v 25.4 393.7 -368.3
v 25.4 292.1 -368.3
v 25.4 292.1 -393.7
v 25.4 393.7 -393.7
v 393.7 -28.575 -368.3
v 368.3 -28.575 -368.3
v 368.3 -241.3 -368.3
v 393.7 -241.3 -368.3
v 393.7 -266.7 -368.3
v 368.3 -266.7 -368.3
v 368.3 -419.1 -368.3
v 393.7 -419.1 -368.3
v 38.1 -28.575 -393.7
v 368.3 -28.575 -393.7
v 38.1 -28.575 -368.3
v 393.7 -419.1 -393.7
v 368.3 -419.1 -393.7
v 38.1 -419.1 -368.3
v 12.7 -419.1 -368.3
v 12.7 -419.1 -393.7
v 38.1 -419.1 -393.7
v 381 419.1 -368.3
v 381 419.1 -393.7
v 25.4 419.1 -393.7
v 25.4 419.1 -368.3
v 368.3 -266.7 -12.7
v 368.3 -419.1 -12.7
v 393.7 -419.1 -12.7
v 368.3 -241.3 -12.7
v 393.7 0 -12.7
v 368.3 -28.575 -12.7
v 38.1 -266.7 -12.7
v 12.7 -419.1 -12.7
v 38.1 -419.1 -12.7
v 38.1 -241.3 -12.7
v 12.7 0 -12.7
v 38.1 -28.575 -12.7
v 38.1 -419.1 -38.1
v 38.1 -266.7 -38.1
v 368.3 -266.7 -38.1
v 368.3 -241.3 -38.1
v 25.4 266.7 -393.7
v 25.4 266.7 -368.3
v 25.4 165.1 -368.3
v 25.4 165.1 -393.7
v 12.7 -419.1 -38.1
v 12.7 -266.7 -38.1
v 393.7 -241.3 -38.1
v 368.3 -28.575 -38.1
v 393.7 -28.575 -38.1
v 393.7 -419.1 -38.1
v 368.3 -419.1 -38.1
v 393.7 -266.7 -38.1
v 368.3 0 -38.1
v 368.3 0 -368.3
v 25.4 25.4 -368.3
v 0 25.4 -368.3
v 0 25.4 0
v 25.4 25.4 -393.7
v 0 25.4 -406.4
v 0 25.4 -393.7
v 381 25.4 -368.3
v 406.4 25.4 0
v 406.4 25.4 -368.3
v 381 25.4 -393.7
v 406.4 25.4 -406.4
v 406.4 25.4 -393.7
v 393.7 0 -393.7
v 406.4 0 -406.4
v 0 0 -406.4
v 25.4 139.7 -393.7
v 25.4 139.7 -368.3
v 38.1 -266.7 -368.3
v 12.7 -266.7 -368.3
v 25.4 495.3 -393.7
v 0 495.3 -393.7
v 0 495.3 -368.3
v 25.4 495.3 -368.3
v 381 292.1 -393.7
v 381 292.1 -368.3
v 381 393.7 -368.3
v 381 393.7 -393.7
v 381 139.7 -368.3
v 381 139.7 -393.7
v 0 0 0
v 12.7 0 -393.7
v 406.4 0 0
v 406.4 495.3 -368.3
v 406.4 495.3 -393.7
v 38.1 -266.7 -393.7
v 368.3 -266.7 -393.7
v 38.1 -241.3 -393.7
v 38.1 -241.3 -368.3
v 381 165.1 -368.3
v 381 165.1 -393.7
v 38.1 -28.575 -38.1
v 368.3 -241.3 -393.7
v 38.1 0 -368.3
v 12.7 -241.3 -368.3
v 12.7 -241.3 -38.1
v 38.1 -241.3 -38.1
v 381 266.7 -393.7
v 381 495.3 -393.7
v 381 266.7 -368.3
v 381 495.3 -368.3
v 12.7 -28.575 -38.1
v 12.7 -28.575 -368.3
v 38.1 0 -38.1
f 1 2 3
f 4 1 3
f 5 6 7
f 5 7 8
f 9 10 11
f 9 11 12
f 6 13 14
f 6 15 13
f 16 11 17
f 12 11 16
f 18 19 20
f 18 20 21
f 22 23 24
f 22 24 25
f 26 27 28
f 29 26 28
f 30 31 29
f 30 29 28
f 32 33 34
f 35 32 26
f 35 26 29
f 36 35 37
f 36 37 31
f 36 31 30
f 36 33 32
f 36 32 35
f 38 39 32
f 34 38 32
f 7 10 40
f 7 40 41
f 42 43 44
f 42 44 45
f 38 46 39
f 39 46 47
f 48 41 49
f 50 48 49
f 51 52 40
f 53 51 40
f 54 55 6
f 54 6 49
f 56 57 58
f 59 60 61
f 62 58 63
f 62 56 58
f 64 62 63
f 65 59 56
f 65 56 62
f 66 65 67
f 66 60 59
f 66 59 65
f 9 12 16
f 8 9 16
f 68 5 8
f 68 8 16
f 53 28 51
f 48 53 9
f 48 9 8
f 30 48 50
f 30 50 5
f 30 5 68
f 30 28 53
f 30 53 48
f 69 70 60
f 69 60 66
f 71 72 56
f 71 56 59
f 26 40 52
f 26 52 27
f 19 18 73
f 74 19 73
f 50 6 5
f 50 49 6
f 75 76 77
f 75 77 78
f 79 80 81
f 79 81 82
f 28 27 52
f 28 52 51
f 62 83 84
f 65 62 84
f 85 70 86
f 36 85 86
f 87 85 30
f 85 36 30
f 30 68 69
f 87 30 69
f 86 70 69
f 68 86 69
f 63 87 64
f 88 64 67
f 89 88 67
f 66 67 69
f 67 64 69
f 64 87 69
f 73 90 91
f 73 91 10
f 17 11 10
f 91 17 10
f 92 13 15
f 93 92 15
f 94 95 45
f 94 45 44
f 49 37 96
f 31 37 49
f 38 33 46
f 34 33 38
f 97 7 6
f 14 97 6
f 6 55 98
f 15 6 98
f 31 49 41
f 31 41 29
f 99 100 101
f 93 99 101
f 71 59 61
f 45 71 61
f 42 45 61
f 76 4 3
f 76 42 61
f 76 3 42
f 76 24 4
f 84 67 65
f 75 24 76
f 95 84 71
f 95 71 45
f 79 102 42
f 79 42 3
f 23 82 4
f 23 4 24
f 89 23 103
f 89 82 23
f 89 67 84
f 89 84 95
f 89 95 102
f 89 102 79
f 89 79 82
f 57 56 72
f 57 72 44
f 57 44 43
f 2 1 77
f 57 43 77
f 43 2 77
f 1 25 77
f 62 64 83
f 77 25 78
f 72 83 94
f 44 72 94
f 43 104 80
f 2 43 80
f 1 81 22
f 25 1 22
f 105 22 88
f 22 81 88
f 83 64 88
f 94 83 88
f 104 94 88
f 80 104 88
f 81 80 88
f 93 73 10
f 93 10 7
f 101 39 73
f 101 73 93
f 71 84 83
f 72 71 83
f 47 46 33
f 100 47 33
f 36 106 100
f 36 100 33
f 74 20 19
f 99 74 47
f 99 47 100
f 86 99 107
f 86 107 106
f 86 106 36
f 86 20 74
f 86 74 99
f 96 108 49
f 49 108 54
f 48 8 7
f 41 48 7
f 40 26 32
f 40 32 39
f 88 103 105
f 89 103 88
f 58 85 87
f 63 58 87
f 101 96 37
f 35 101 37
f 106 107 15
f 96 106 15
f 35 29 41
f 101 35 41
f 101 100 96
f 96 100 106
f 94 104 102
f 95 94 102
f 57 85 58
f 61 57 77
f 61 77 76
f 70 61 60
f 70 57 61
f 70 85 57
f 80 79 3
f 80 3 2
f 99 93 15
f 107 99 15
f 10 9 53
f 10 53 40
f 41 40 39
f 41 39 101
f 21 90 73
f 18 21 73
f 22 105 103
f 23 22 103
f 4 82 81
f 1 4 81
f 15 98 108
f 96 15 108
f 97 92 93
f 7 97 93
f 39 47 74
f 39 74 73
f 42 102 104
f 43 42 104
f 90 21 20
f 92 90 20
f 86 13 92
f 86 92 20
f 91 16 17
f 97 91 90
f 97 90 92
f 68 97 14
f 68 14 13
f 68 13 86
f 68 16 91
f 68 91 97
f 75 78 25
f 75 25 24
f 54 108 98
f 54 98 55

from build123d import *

# Parameters (mm, degrees)
SKETCH1_W            = 406.4
SKETCH1_H            = 406.4
BOSS_EXTRUDE1_DEPTH  = 25.4
SKETCH2_W            = 25.4
SKETCH2_H            = 25.4
SKETCH2_W_2          = 330.2
SKETCH2_H_2          = 330.2
BOSS_EXTRUDE4_DEPTH  = 28.575
SKETCH4_W            = 25.4
SKETCH4_H            = 25.4
BOSS_EXTRUDE5_DEPTH  = 390.525
SKETCH6_W            = 25.4
SKETCH6_H            = 25.4
BOSS_EXTRUDE6_DEPTH  = 355.6
SKETCH8_W            = 25.4
SKETCH8_H            = 25.4
BOSS_EXTRUDE7_DEPTH  = 355.6
SKETCH9_W            = 25.4
SKETCH9_H            = 25.4
BOSS_EXTRUDE8_DEPTH  = 355.6
SKETCH10_W           = 25.4
SKETCH10_H           = 25.4
BOSS_EXTRUDE9_DEPTH  = 355.6
SKETCH11_W           = 25.4
SKETCH11_H           = 25.4
BOSS_EXTRUDE11_DEPTH = 469.9
SKETCH12_W           = 25.4
SKETCH12_H           = 25.4
BOSS_EXTRUDE12_DEPTH = 376.174


with BuildPart() as part:
    # Sketch1 → Boss-Extrude1 (new body)
    with BuildSketch(Plane(origin=(0, 0, 0), x_dir=(1, 0, 0), z_dir=(0, 1, 0))):
        with Locations((203.2, 203.2)):
            Rectangle(SKETCH1_W, SKETCH1_H)
    extrude(amount=BOSS_EXTRUDE1_DEPTH)

    # Sketch2 → Boss-Extrude4 (add)
    with BuildSketch(Plane.XZ):
        with Locations((25.4, -25.4)):
            Rectangle(SKETCH2_W, SKETCH2_H)
        with Locations((203.2, -25.4)):
            Rectangle(SKETCH2_W_2, SKETCH2_H)
        with Locations((25.4, -203.2)):
            Rectangle(SKETCH2_W, SKETCH2_H_2)
        with Locations((203.2, -381)):
            Rectangle(SKETCH2_W_2, SKETCH2_H)
        with Locations((25.4, -381)):
            Rectangle(SKETCH2_W, SKETCH2_H)
        with Locations((381, -381)):
            Rectangle(SKETCH2_W, SKETCH2_H)
        with Locations((381, -203.2)):
            Rectangle(SKETCH2_W, SKETCH2_H_2)
        with Locations((381, -25.4)):
            Rectangle(SKETCH2_W, SKETCH2_H)
    extrude(amount=BOSS_EXTRUDE4_DEPTH)

    # Sketch4 → Boss-Extrude5 (add)
    with BuildSketch(Plane.XZ.offset(28.575)):
        with Locations((25.4, -25.4)):
            Rectangle(SKETCH4_W, SKETCH4_H)
        with Locations((381, -25.4)):
            Rectangle(SKETCH4_W, SKETCH4_H)
        with Locations((381, -381)):
            Rectangle(SKETCH4_W, SKETCH4_H)
        with Locations((25.4, -381)):
            Rectangle(SKETCH4_W, SKETCH4_H)
    extrude(amount=BOSS_EXTRUDE5_DEPTH)

    # Sketch6 → Boss-Extrude6 (add)
    with BuildSketch(Plane(origin=(38.1, 0, 0), x_dir=(0, 0, -1), z_dir=(1, 0, 0))):
        with Locations((25.4, -254)):
            Rectangle(SKETCH6_W, SKETCH6_H)
    extrude(amount=BOSS_EXTRUDE6_DEPTH)

    # Sketch8 → Boss-Extrude7 (add)
    with BuildSketch(Plane(origin=(0, 0, -38.1), x_dir=(-1, 0, 0), z_dir=(0, 0, -1))):
        with Locations((-381, -254)):
            Rectangle(SKETCH8_W, SKETCH8_H)
    extrude(amount=BOSS_EXTRUDE7_DEPTH)

    # Sketch9 → Boss-Extrude8 (add)
    with BuildSketch(Plane.ZY.offset(-368.3)):
        with Locations((-381, -254)):
            Rectangle(SKETCH9_W, SKETCH9_H)
    extrude(amount=BOSS_EXTRUDE8_DEPTH)

    # Sketch10 → Boss-Extrude9 (add)
    with BuildSketch(Plane.XY.offset(-368.3)):
        with Locations((25.4, -254)):
            Rectangle(SKETCH10_W, SKETCH10_H)
    extrude(amount=BOSS_EXTRUDE9_DEPTH)

    # Sketch11 → Boss-Extrude11 (add)
    with BuildSketch(Plane(origin=(0, 25.4, 0), x_dir=(1, 0, 0), z_dir=(0, 1, 0))):
        with Locations((12.7, 381)):
            Rectangle(SKETCH11_W, SKETCH11_H)
        with Locations((393.7, 381)):
            Rectangle(SKETCH11_W, SKETCH11_H)
    extrude(amount=BOSS_EXTRUDE11_DEPTH)

    # Sketch12 → Boss-Extrude12 (add)
    with BuildSketch(Plane.ZY.offset(-381)):
        with Locations((-381, 406.4)):
            Rectangle(SKETCH12_W, SKETCH12_H)
        with Locations((-381, 279.4)):
            Rectangle(SKETCH12_W, SKETCH12_H)
        with Locations((-381, 152.4)):
            Rectangle(SKETCH12_W, SKETCH12_H)
    extrude(amount=BOSS_EXTRUDE12_DEPTH)


solid = part.part
